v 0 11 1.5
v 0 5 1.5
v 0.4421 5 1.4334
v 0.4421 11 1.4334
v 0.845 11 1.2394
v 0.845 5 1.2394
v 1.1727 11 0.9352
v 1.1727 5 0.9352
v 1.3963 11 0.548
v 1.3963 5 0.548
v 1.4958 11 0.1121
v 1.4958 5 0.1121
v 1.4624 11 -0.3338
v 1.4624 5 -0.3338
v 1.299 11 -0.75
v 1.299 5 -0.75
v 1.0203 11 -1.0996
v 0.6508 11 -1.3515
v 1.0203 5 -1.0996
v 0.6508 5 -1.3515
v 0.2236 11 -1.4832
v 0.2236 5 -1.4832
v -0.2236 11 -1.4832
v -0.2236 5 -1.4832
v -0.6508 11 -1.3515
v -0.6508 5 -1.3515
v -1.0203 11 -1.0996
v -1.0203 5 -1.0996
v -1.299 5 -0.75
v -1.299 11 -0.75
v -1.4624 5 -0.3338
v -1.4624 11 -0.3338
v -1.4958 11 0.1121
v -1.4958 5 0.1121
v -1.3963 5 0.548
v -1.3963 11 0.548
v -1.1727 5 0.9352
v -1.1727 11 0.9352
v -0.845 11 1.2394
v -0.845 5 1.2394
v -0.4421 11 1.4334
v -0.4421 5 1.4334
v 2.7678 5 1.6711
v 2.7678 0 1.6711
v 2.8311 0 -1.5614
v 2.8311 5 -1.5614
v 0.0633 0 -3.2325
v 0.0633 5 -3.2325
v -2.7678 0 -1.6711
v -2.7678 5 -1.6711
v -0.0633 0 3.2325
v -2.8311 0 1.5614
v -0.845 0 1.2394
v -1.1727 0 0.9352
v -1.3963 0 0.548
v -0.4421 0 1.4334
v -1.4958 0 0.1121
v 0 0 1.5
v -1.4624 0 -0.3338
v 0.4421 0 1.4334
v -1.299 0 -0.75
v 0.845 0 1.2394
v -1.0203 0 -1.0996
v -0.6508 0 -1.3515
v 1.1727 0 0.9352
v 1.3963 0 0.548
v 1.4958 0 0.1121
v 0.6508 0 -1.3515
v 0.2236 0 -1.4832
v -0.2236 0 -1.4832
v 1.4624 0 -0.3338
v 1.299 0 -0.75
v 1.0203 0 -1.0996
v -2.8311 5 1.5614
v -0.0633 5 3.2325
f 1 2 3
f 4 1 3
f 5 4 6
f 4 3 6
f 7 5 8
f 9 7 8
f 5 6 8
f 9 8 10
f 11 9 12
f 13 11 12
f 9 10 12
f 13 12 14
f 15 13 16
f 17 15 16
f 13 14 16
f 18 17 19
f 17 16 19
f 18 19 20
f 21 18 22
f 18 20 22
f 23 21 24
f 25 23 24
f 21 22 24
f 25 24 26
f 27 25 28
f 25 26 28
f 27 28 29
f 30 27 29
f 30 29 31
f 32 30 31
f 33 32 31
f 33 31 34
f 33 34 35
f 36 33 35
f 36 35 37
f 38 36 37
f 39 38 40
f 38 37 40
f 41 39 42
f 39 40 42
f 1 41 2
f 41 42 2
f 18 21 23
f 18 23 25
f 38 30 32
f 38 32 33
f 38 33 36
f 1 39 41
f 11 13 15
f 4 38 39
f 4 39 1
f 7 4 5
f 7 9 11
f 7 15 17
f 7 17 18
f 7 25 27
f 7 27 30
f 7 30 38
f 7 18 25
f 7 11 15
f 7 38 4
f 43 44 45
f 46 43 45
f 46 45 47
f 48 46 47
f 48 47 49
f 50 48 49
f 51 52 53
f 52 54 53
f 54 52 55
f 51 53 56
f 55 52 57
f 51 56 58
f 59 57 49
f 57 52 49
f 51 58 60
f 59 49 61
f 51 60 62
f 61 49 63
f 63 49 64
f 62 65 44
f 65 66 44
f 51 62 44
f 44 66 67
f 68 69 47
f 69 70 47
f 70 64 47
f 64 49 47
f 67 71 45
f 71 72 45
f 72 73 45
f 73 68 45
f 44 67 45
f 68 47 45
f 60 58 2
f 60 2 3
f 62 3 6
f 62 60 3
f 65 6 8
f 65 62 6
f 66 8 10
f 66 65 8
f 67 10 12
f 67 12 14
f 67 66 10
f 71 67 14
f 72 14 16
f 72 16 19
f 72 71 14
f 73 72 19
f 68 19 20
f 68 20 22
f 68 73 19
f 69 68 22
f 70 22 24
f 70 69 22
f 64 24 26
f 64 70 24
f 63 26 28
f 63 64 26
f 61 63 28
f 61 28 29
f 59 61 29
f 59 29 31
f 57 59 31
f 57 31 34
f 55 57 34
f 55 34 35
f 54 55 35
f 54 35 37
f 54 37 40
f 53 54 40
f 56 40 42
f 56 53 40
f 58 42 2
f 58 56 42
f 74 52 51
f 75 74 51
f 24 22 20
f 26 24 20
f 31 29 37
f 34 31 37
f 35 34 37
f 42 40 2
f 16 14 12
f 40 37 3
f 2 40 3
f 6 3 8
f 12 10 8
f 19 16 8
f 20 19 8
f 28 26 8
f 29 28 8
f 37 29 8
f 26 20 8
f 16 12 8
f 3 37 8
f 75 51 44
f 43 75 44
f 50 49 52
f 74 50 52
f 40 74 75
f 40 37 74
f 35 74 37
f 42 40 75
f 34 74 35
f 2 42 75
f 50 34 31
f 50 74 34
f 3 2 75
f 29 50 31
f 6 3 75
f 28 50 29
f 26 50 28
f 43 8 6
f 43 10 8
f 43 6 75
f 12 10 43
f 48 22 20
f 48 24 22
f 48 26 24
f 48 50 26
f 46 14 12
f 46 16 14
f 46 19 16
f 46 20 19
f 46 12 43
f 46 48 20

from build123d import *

# Parameters (mm, degrees)
SKETCH1_R           = 1.5
BOSS_EXTRUDE1_DEPTH = 5
SKETCH2_R           = 1.5
BOSS_EXTRUDE2_DEPTH = 6


with BuildPart() as part:
    # Sketch1 → Boss-Extrude1 (new body)
    with BuildSketch(Plane(origin=(0, 0, 0), x_dir=(1, 0, 0), z_dir=(0, 1, 0))):
        Polygon((2.767794612, -1.671121275), (2.831130783, 1.561419809), (0.063336171, 3.232541084), (-2.767794612, 1.671121275), (-2.831130783, -1.561419809), (-0.063336171, -3.232541084), align=None)
        with Locations(Location((0, 0, 0), (0, 0, 270))):
            Circle(SKETCH1_R, mode=Mode.SUBTRACT)
    extrude(amount=BOSS_EXTRUDE1_DEPTH)


with BuildPart() as body_2:
    # Sketch2 → Boss-Extrude2 (new body)
    with BuildSketch(Plane(origin=(0, 5, 0), x_dir=(1, 0, 0), z_dir=(0, 1, 0))):
        with Locations(Location((0, 0, 0), (0, 0, 270))):
            Circle(SKETCH2_R)
    extrude(amount=BOSS_EXTRUDE2_DEPTH)


solid = Compound([part.part, body_2.part])
